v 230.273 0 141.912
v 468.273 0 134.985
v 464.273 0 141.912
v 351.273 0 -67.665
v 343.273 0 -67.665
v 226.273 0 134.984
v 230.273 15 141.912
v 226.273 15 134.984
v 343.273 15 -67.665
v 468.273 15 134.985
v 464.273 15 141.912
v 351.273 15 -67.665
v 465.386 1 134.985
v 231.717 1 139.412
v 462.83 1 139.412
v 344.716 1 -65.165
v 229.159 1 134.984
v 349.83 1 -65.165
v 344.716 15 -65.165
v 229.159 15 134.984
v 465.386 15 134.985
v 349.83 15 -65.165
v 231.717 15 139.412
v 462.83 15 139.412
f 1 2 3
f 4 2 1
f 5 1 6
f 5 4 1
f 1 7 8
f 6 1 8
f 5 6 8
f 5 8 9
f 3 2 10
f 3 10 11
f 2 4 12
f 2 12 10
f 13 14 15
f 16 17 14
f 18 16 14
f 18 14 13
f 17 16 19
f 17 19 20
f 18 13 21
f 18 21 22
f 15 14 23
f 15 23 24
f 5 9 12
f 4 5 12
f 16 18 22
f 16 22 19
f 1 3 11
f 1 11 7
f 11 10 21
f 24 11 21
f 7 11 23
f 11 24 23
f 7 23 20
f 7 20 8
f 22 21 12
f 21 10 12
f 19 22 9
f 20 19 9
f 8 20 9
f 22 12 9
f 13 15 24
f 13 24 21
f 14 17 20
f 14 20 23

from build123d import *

# Parameters (mm, degrees)
BOSS_EXTRUDE6_DEPTH = 1
BOSS_EXTRUDE8_DEPTH = 15


with BuildPart() as part:
    # Sketch1 → Boss-Extrude6 (new body)
    with BuildSketch(Plane(origin=(0, 0, 0), x_dir=(1, 0, 0), z_dir=(0, 1, 0))):
        Polygon((231.716666588, -139.412373829), (462.829865412, -139.412373829), (465.38624875, -134.984588004), (349.829542096, 65.165499075), (344.716133219, 65.165499075), (229.159432538, -134.984249178), align=None)
    extrude(amount=BOSS_EXTRUDE6_DEPTH)

    # Sketch1<7> → Boss-Extrude8 (add)
    with BuildSketch(Plane(origin=(0, 0, 0), x_dir=(1, 0, 0), z_dir=(0, 1, 0))):
        Polygon((351.272917769, 67.665499075), (468.273000096, -134.984588004), (464.273241085, -141.912373829), (230.273290915, -141.912373829), (226.272682946, -134.984246139), (343.272757546, 67.665499075), align=None)
        Polygon((231.716666588, -139.412373829), (462.829865412, -139.412373829), (465.38624875, -134.984588004), (349.829542096, 65.165499075), (344.716133219, 65.165499075), (229.159432538, -134.984249178), align=None, mode=Mode.SUBTRACT)
    extrude(amount=BOSS_EXTRUDE8_DEPTH)


solid = part.part
